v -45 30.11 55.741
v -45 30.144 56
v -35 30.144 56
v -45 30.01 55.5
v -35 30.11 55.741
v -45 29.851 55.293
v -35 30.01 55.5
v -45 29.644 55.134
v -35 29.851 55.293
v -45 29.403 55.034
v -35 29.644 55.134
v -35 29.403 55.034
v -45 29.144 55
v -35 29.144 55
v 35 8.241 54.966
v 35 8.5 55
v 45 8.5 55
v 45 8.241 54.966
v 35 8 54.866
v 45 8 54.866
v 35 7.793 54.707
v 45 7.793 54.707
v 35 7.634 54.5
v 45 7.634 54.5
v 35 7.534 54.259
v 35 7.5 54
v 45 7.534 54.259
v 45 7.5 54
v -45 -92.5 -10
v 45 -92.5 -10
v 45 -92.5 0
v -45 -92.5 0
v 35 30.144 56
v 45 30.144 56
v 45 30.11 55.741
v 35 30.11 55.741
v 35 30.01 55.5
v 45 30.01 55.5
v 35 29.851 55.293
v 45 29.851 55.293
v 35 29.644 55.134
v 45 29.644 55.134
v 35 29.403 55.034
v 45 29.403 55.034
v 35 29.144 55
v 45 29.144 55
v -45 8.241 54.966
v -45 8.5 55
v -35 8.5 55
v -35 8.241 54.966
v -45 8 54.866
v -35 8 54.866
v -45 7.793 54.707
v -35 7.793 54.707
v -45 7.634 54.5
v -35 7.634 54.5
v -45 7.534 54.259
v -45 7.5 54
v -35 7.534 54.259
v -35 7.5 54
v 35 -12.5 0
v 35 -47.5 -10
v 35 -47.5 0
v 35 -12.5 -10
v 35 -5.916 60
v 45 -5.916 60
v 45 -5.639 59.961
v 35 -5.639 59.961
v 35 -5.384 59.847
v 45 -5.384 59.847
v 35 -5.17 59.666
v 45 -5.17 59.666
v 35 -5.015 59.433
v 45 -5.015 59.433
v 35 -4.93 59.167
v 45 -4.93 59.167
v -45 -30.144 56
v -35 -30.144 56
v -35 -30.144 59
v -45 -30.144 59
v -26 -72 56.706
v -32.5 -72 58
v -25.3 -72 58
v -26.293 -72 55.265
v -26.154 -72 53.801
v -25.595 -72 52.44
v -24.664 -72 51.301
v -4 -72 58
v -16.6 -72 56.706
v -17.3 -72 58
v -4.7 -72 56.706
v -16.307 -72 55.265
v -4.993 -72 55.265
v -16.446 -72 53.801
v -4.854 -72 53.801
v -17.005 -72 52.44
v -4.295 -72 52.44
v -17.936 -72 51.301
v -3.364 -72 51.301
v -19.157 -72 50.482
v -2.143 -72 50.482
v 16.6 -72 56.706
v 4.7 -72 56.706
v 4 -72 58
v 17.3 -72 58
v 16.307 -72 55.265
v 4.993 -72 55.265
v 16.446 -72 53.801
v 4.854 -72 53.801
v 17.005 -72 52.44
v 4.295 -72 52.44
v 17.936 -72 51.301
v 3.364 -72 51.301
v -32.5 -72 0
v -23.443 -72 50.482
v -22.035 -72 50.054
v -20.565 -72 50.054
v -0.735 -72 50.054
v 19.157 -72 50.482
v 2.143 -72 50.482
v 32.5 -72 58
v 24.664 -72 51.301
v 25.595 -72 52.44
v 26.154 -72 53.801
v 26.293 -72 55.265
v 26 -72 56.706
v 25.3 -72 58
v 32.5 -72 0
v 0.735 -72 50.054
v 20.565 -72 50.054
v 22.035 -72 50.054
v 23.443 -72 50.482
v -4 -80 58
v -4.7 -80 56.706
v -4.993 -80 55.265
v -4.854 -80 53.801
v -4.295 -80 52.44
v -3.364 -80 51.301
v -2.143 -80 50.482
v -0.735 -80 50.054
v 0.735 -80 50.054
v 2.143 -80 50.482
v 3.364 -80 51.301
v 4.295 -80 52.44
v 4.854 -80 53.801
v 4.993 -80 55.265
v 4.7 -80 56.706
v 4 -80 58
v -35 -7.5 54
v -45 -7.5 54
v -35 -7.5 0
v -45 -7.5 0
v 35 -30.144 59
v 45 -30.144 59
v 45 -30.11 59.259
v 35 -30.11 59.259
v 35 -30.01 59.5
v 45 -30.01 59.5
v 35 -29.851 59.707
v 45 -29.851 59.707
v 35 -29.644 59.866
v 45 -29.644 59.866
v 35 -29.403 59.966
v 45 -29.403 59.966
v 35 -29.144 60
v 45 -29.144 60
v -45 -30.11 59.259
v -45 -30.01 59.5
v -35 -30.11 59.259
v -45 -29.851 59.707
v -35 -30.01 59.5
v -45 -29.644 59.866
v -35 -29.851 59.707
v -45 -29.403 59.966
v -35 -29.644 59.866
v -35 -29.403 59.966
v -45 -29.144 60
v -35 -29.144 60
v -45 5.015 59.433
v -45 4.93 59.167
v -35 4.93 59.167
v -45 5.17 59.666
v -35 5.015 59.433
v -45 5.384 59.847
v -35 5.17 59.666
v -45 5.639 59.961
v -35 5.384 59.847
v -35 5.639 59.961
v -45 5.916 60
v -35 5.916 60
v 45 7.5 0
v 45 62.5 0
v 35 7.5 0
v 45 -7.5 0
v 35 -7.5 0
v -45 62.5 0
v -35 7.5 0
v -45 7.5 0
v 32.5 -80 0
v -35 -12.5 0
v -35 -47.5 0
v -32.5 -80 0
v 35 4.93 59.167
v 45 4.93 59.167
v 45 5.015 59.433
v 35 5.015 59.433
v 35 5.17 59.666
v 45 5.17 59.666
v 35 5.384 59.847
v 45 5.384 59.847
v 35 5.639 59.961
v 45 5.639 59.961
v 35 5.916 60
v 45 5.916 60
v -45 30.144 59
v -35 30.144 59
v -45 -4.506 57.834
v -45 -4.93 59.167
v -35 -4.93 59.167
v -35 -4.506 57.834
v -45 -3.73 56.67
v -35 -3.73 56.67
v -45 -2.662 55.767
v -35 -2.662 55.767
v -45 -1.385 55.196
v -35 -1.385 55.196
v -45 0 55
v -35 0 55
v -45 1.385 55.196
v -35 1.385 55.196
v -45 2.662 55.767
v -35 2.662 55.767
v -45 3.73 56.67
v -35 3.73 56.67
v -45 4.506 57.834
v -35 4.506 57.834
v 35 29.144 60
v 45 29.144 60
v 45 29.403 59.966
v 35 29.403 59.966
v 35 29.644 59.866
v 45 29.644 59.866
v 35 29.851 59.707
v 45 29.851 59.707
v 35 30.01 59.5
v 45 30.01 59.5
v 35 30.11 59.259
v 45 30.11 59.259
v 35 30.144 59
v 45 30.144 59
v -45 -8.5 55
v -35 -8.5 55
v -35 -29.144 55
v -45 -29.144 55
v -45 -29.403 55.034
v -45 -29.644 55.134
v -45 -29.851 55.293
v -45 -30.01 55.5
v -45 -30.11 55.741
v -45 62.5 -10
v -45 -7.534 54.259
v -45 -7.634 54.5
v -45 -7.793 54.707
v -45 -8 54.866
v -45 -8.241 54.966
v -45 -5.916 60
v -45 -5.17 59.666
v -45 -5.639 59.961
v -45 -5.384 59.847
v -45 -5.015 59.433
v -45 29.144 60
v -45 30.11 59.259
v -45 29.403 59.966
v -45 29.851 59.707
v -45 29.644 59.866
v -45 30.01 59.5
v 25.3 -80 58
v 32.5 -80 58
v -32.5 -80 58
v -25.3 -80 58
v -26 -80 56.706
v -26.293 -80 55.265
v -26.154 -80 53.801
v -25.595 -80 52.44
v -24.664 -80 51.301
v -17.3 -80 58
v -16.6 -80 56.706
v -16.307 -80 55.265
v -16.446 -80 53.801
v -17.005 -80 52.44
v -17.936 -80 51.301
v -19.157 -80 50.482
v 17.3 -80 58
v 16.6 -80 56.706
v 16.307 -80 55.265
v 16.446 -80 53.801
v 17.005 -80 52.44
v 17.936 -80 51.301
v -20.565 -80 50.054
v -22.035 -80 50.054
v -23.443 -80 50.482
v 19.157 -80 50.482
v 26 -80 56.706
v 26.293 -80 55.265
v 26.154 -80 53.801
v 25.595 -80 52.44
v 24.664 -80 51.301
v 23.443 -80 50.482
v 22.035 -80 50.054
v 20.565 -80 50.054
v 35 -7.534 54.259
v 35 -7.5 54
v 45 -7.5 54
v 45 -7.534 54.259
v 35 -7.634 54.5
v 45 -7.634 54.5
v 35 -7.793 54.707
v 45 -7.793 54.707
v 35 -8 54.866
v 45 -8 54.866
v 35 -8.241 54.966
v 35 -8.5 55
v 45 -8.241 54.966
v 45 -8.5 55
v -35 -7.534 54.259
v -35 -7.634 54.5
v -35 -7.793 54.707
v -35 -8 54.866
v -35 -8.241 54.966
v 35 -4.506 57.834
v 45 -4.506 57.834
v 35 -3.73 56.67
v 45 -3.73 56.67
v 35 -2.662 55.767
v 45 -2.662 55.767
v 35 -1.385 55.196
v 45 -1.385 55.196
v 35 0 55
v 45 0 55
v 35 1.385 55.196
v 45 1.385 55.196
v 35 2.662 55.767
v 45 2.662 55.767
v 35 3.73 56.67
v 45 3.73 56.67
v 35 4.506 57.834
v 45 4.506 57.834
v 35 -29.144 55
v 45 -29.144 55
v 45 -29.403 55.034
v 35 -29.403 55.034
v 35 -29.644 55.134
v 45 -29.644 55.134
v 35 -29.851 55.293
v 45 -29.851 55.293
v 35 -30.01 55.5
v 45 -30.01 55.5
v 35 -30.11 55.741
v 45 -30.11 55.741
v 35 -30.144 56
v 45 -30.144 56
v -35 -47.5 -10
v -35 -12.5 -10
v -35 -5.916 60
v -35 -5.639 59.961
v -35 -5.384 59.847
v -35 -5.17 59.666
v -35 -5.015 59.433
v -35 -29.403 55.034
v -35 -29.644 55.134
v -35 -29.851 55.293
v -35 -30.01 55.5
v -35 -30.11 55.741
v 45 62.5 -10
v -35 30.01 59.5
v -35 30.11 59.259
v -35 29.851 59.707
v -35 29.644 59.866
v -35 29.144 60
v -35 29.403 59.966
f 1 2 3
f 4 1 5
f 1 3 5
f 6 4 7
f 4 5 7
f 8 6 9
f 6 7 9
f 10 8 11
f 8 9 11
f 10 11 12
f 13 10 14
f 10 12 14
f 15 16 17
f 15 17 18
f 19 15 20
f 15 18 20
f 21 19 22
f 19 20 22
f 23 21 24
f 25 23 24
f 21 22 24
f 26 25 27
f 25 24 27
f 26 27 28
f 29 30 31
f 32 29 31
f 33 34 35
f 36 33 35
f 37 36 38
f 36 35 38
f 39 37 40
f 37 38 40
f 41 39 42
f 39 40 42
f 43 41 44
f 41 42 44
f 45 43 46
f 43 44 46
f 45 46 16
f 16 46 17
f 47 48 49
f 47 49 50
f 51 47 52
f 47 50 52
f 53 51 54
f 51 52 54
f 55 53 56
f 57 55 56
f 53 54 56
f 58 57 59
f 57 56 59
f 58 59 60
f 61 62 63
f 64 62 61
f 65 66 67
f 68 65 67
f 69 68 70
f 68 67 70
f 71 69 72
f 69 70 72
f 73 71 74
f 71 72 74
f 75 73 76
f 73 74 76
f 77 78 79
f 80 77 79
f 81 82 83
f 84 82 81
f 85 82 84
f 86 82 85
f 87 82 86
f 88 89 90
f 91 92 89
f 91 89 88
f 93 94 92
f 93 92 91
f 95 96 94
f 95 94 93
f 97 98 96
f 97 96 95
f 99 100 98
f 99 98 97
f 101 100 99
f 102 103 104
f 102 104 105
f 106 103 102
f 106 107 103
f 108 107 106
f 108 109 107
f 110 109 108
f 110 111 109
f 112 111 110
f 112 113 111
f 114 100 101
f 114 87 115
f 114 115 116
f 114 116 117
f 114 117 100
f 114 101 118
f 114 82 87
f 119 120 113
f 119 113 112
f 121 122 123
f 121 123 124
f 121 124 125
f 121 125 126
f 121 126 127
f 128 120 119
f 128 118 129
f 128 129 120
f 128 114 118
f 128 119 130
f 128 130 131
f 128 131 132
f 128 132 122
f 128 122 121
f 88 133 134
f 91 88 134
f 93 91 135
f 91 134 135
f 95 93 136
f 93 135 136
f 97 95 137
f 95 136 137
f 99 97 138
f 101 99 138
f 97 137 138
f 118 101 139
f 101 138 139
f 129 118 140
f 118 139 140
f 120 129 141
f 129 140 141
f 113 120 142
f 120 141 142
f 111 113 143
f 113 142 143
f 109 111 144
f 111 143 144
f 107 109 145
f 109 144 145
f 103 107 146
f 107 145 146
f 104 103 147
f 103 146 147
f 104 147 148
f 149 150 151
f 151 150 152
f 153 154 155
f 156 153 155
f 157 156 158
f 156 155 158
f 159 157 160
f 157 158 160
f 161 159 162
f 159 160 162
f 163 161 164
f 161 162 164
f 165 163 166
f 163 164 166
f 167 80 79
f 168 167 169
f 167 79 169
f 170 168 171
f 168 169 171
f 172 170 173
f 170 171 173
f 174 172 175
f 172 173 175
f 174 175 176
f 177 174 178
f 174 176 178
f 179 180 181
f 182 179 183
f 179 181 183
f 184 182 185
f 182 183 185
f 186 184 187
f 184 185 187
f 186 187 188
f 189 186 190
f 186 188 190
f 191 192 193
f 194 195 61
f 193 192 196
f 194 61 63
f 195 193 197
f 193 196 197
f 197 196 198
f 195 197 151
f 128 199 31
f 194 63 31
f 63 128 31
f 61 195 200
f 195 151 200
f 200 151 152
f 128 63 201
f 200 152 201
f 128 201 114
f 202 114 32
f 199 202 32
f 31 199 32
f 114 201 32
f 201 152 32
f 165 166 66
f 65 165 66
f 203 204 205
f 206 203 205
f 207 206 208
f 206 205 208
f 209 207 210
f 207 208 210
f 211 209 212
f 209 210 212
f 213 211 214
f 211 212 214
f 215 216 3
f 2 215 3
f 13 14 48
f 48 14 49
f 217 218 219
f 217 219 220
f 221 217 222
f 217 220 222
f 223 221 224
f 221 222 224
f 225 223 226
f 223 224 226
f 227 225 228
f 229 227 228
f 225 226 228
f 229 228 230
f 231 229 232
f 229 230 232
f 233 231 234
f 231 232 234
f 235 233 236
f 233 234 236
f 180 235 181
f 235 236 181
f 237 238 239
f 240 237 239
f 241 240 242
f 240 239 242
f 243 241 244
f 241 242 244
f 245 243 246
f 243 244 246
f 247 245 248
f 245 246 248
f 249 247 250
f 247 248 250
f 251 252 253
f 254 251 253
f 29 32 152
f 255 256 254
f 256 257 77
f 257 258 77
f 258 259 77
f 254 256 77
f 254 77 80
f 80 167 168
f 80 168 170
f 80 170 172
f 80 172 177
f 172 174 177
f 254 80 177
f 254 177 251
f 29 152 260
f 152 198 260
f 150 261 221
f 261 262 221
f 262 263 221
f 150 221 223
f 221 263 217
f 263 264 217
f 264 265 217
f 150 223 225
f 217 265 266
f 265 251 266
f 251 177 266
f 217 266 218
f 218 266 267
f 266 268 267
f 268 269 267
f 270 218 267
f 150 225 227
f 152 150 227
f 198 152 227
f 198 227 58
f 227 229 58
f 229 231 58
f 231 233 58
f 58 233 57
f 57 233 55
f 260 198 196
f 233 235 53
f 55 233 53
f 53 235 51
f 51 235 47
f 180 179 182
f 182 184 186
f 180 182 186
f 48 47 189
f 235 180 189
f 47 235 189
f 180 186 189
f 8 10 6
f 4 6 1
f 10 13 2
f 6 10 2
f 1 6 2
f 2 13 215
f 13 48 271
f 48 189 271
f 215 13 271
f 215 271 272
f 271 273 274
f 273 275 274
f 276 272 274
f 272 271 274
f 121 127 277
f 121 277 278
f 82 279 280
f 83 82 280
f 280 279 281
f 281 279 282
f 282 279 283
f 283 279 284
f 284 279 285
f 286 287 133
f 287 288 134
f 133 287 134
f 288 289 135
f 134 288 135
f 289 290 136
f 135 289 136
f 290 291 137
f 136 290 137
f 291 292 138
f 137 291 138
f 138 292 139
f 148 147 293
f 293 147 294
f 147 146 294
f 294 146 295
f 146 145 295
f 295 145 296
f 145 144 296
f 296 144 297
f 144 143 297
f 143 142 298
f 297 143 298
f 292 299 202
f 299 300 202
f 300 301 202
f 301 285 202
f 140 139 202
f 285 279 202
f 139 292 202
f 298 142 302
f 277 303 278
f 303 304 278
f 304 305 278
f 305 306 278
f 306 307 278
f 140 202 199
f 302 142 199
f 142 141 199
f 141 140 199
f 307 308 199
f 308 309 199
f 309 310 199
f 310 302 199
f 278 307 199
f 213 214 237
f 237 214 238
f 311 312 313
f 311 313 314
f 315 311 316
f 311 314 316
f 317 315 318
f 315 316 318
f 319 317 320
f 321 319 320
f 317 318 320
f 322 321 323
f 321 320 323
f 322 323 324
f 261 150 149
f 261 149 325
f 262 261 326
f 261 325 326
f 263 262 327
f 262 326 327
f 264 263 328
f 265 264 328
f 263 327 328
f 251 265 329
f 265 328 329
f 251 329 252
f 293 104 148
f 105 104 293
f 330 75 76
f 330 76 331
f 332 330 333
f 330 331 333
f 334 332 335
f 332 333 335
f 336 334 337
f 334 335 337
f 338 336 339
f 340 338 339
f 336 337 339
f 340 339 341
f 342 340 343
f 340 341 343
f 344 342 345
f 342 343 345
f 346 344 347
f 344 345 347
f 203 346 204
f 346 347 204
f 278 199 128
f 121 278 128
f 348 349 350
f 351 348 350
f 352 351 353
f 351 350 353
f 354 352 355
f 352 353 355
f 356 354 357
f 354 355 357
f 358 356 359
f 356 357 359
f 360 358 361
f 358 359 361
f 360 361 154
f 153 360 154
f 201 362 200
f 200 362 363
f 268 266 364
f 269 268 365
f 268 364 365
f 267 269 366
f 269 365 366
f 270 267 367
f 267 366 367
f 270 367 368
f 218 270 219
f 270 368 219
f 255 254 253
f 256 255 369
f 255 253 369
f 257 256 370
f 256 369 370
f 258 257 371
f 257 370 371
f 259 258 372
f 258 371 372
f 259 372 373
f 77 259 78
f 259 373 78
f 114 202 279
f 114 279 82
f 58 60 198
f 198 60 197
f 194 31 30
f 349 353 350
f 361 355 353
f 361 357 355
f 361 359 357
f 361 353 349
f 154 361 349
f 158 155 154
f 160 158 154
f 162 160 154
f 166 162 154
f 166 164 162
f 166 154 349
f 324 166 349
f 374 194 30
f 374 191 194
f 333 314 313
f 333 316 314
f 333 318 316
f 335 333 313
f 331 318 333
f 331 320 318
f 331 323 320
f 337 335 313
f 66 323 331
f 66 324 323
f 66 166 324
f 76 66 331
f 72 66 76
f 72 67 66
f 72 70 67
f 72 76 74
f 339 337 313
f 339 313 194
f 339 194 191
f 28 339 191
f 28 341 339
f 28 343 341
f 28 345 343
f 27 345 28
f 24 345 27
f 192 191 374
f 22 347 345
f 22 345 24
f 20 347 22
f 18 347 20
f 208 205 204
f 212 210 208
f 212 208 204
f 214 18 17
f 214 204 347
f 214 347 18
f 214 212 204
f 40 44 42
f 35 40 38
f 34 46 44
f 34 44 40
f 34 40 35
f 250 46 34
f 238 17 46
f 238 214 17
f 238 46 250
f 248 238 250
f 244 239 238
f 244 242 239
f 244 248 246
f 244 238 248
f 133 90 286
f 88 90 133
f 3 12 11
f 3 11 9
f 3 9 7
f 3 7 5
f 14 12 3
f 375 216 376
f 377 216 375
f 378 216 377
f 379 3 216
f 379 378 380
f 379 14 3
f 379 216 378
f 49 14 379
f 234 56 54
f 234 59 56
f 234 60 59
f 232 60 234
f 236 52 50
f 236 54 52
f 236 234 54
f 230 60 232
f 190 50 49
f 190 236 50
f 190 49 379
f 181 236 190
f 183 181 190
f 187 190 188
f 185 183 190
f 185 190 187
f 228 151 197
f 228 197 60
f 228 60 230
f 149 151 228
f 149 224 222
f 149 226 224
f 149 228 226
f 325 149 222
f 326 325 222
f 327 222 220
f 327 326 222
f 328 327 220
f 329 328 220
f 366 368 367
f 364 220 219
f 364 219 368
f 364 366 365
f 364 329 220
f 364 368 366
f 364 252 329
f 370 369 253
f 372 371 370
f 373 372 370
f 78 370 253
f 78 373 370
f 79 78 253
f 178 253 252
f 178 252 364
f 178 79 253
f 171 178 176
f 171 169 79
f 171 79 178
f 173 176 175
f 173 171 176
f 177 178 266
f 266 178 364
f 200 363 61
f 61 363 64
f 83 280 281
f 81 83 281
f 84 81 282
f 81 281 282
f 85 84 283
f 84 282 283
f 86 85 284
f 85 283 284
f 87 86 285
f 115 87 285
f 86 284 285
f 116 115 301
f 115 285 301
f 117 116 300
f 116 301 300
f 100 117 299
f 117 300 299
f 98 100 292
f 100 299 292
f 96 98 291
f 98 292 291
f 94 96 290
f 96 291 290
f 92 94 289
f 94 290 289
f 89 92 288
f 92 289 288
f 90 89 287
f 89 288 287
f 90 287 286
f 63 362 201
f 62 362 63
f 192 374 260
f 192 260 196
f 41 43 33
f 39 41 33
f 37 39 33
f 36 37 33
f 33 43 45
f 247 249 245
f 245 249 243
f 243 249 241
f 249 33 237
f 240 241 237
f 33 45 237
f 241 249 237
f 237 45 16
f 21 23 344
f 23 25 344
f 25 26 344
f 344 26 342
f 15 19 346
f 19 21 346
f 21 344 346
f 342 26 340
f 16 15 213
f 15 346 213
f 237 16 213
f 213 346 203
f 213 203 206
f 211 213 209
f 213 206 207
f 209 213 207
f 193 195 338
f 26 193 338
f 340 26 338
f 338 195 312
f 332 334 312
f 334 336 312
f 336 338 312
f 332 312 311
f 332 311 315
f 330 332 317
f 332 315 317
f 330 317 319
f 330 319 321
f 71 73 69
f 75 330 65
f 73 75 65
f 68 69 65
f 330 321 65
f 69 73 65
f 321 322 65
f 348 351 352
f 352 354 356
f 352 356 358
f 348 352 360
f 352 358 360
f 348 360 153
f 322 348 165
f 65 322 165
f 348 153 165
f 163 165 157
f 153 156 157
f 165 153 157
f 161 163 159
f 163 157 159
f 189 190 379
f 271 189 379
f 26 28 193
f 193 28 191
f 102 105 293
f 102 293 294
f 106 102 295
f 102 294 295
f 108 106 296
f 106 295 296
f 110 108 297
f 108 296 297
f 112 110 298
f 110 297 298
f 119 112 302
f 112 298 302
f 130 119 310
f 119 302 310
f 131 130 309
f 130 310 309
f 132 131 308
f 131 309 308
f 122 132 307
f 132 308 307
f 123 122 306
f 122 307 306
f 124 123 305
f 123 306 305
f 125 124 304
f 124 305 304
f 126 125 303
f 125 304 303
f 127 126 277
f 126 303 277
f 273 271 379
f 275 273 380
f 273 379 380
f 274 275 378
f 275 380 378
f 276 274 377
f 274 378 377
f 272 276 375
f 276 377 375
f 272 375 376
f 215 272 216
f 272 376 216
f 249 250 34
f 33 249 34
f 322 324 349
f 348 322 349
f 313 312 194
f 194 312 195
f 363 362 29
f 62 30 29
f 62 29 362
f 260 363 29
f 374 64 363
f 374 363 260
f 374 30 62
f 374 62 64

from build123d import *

# Parameters (mm, degrees)
SKETCH1_W               = 125
SKETCH1_H               = 90
BOSS_EXTRUDE1_DEPTH     = 10
BOSS_EXTRUDE2_DEPTH     = 35
BOSS_EXTRUDE3_DEPTH     = 45
SKETCH11_W              = 90
SKETCH11_H              = 30
BOSS_EXTRUDE5_DEPTH     = 10
CUT_EXTRUDE2_DEPTH      = 126
CUT_EXTRUDE2_DEPTH_BACK = 126
SKETCH7_W               = 35
SKETCH7_H               = 43
SKETCH7_H_2             = 6
SKETCH7_H_3             = 1
SKETCH17_W              = 60.575148418
SKETCH17_H              = 1.596164387
SKETCH17_W_2            = 94.424851582
BOSS_EXTRUDE7_DEPTH     = 90
SKETCH18_W              = 155
SKETCH18_H              = 8.403835613
BOSS_EXTRUDE8_DEPTH     = 90
CUT_EXTRUDE3_DEPTH      = 143.324453275
CUT_EXTRUDE3_DEPTH_BACK = 143.324453275
CUT_EXTRUDE4_DEPTH      = 126
CUT_EXTRUDE4_DEPTH_BACK = 126
SKETCH21_W              = 70
SKETCH21_H              = 10
CUT_EXTRUDE5_DEPTH      = 120.085053638
CUT_EXTRUDE5_DEPTH_BACK = 120.085053638
SKETCH22_W              = 70
SKETCH22_H              = 35
SKETCH23_W              = 65
SKETCH23_H              = 8
BOSS_EXTRUDE9_DEPTH     = 58
SKETCH24_R              = 5
CUT_EXTRUDE6_DEPTH      = 29


with BuildPart() as part:
    # Sketch1 → Boss-Extrude1 (new body)
    with BuildSketch(Plane(origin=(0, 0, 0), x_dir=(0, 1, 0), z_dir=(0, 0, 1))):
        Rectangle(SKETCH1_W, SKETCH1_H)
    extrude(amount=BOSS_EXTRUDE1_DEPTH)

    # Sketch3 → Boss-Extrude2 (add, symmetric)
    with BuildSketch(Plane.YZ):
        with BuildLine():
            Line((5.916079783, 60), (7.5, 60))
            Line((7.5, 60), (29.144025452, 60))
            ThreePointArc((29.144025452, 60), (29.851132233, 59.707106781), (30.144025452, 59))
            Line((30.144025452, 59), (30.144025452, 56))
            ThreePointArc((30.144025452, 56), (29.851132233, 55.292893219), (29.144025452, 55))
            Line((29.144025452, 55), (8.5, 55))
            ThreePointArc((8.5, 55), (7.792893219, 54.707106781), (7.5, 54))
            Line((7.5, 54), (7.5, 0))
            Line((7.5, 0), (-7.5, 0))
            Line((-7.5, 0), (-7.5, 54))
            ThreePointArc((-7.5, 54), (-7.792893219, 54.707106781), (-8.5, 55))
            Line((-8.5, 55), (-29.144025452, 55))
            ThreePointArc((-29.144025452, 55), (-29.851132233, 55.292893219), (-30.144025452, 56))
            Line((-30.144025452, 56), (-30.144025452, 59))
            ThreePointArc((-30.144025452, 59), (-29.851132233, 59.707106781), (-29.144025452, 60))
            Line((-29.144025452, 60), (-7.5, 60))
            Line((-7.5, 60), (-5.916079783, 60))
            ThreePointArc((-5.916079783, 60), (-5.270582559, 59.763762616), (-4.930066486, 59.166666667))
            ThreePointArc((-4.930066486, 59.166666667), (0, 55), (4.930066486, 59.166666667))
            ThreePointArc((4.930066486, 59.166666667), (5.270582559, 59.763762616), (5.916079783, 60))
        make_face()
    extrude(amount=BOSS_EXTRUDE2_DEPTH, both=True)

    # Sketch5 → Boss-Extrude3 (add, symmetric)
    with BuildSketch(Plane.YZ):
        with BuildLine():
            ThreePointArc((-7.5, 54), (-7.792893219, 54.707106781), (-8.5, 55))
            Line((-8.5, 55), (-29.144025452, 55))
            ThreePointArc((-29.144025452, 55), (-29.851132233, 55.292893219), (-30.144025452, 56))
            Line((-30.144025452, 56), (-30.144025452, 59))
            ThreePointArc((-30.144025452, 59), (-29.851132233, 59.707106781), (-29.144025452, 60))
            Line((-29.144025452, 60), (-5.916079783, 60))
            ThreePointArc((-5.916079783, 60), (-5.270582559, 59.763762616), (-4.930066486, 59.166666667))
            ThreePointArc((-4.930066486, 59.166666667), (0, 55), (4.930066486, 59.166666667))
            ThreePointArc((4.930066486, 59.166666667), (5.270582559, 59.763762616), (5.916079783, 60))
            Line((5.916079783, 60), (29.144025452, 60))
            ThreePointArc((29.144025452, 60), (29.851132233, 59.707106781), (30.144025452, 59))
            Line((30.144025452, 59), (30.144025452, 56))
            ThreePointArc((30.144025452, 56), (29.851132233, 55.292893219), (29.144025452, 55))
            Line((29.144025452, 55), (8.5, 55))
            ThreePointArc((8.5, 55), (7.792893219, 54.707106781), (7.5, 54))
            Line((7.5, 54), (7.5, 11))
            ThreePointArc((7.5, 11), (7.792893219, 10.292893219), (8.5, 10))
            Line((8.5, 10), (-8.5, 10))
            ThreePointArc((-8.5, 10), (-7.792893219, 10.292893219), (-7.5, 11))
            Line((-7.5, 11), (-7.5, 54))
        make_face()
    extrude(amount=BOSS_EXTRUDE3_DEPTH, both=True)

    # Sketch11 → Boss-Extrude5 (add)
    with BuildSketch(Plane.XY.offset(10)):
        with Locations((0, -77.5)):
            Rectangle(SKETCH11_W, SKETCH11_H)
    extrude(amount=-BOSS_EXTRUDE5_DEPTH)

    # Sketch7 → Cut-Extrude2 (cut, two sides: drawn at the far end of the back side and taken through both)
    with BuildSketch(Plane(origin=(0, 7.5, 0), x_dir=(-1, 0, 0), z_dir=(0, 1, 0)).offset(-CUT_EXTRUDE2_DEPTH_BACK)):
        with Locations((-17.5, 32.5)):
            Rectangle(SKETCH7_W, SKETCH7_H)
        Polygon((0, 54), (0, 11), (35, 11), (35, 35), (35, 54), align=None)
        with Locations((17.5, 57)):
            Rectangle(SKETCH7_W, SKETCH7_H_2)
        with Locations((-17.5, 57)):
            Rectangle(SKETCH7_W, SKETCH7_H_2)
        with Locations((-17.5, 10.5)):
            Rectangle(SKETCH7_W, SKETCH7_H_3)
        with Locations((17.5, 10.5)):
            Rectangle(SKETCH7_W, SKETCH7_H_3)
    extrude(amount=CUT_EXTRUDE2_DEPTH + CUT_EXTRUDE2_DEPTH_BACK, mode=Mode.SUBTRACT)

    # Sketch17 → Boss-Extrude7 (add)
    with BuildSketch(Plane.YZ.offset(45)):
        with Locations((-62.212425791, -0.798082194)):
            Rectangle(SKETCH17_W, SKETCH17_H)
        with Locations((15.287574209, -0.798082194)):
            Rectangle(SKETCH17_W_2, SKETCH17_H)
    extrude(amount=-BOSS_EXTRUDE7_DEPTH)

    # Sketch18 → Boss-Extrude8 (add)
    with BuildSketch(Plane.YZ.offset(45)):
        with Locations((-15, -5.798082193)):
            Rectangle(SKETCH18_W, SKETCH18_H)
    extrude(amount=-BOSS_EXTRUDE8_DEPTH)

    # Sketch19 → Cut-Extrude3 (cut, two sides: drawn at the far end of the back side and taken through both)
    with BuildSketch(Plane.YZ.offset(45).offset(-CUT_EXTRUDE3_DEPTH_BACK)):
        with BuildLine():
            Line((-92.5, 10), (-8.5, 10))
            ThreePointArc((-8.5, 10), (-7.792893219, 10.292893219), (-7.5, 11))
            Line((-7.5, 11), (-7.5, 0))
            Line((-7.5, 0), (-92.5, 0))
            Line((-92.5, 0), (-92.5, 10))
        make_face()
        with BuildLine():
            Line((62.5, 10), (62.5, 0))
            Line((62.5, 0), (7.5, 0))
            Line((7.5, 0), (7.5, 11))
            ThreePointArc((7.5, 11), (7.792893219, 10.292893219), (8.5, 10))
            Line((8.5, 10), (62.5, 10))
        make_face()
    extrude(amount=CUT_EXTRUDE3_DEPTH + CUT_EXTRUDE3_DEPTH_BACK, mode=Mode.SUBTRACT)

    # Sketch21 → Cut-Extrude4 (cut, two sides: drawn at the far end of the back side and taken through both)
    with BuildSketch(Plane(origin=(0, 7.5, 0), x_dir=(-1, 0, 0), z_dir=(0, 1, 0)).offset(-CUT_EXTRUDE4_DEPTH_BACK)):
        with Locations((0, 5)):
            Rectangle(SKETCH21_W, SKETCH21_H)
    extrude(amount=CUT_EXTRUDE4_DEPTH + CUT_EXTRUDE4_DEPTH_BACK, mode=Mode.SUBTRACT)

    # Sketch22 → Cut-Extrude5 (cut, two sides: drawn at the far end of the back side and taken through both)
    with BuildSketch(Plane.XY.offset(-CUT_EXTRUDE5_DEPTH_BACK)):
        with Locations((0, -30)):
            Rectangle(SKETCH22_W, SKETCH22_H)
    extrude(amount=CUT_EXTRUDE5_DEPTH + CUT_EXTRUDE5_DEPTH_BACK, mode=Mode.SUBTRACT)

    # Sketch23 → Boss-Extrude9 (add)
    with BuildSketch(Plane.XY):
        with Locations((0, -76)):
            Rectangle(SKETCH23_W, SKETCH23_H)
    extrude(amount=BOSS_EXTRUDE9_DEPTH)

    # Sketch24 → Cut-Extrude6 (cut, symmetric)
    with BuildSketch(Plane.XZ.offset(80)):
        with Locations((0, 55)):
            Circle(SKETCH24_R)
        with Locations((-21.3, 55)):
            Circle(SKETCH24_R)
        with Locations((21.3, 55)):
            Circle(SKETCH24_R)
    extrude(amount=CUT_EXTRUDE6_DEPTH, both=True, mode=Mode.SUBTRACT)


solid = part.part
